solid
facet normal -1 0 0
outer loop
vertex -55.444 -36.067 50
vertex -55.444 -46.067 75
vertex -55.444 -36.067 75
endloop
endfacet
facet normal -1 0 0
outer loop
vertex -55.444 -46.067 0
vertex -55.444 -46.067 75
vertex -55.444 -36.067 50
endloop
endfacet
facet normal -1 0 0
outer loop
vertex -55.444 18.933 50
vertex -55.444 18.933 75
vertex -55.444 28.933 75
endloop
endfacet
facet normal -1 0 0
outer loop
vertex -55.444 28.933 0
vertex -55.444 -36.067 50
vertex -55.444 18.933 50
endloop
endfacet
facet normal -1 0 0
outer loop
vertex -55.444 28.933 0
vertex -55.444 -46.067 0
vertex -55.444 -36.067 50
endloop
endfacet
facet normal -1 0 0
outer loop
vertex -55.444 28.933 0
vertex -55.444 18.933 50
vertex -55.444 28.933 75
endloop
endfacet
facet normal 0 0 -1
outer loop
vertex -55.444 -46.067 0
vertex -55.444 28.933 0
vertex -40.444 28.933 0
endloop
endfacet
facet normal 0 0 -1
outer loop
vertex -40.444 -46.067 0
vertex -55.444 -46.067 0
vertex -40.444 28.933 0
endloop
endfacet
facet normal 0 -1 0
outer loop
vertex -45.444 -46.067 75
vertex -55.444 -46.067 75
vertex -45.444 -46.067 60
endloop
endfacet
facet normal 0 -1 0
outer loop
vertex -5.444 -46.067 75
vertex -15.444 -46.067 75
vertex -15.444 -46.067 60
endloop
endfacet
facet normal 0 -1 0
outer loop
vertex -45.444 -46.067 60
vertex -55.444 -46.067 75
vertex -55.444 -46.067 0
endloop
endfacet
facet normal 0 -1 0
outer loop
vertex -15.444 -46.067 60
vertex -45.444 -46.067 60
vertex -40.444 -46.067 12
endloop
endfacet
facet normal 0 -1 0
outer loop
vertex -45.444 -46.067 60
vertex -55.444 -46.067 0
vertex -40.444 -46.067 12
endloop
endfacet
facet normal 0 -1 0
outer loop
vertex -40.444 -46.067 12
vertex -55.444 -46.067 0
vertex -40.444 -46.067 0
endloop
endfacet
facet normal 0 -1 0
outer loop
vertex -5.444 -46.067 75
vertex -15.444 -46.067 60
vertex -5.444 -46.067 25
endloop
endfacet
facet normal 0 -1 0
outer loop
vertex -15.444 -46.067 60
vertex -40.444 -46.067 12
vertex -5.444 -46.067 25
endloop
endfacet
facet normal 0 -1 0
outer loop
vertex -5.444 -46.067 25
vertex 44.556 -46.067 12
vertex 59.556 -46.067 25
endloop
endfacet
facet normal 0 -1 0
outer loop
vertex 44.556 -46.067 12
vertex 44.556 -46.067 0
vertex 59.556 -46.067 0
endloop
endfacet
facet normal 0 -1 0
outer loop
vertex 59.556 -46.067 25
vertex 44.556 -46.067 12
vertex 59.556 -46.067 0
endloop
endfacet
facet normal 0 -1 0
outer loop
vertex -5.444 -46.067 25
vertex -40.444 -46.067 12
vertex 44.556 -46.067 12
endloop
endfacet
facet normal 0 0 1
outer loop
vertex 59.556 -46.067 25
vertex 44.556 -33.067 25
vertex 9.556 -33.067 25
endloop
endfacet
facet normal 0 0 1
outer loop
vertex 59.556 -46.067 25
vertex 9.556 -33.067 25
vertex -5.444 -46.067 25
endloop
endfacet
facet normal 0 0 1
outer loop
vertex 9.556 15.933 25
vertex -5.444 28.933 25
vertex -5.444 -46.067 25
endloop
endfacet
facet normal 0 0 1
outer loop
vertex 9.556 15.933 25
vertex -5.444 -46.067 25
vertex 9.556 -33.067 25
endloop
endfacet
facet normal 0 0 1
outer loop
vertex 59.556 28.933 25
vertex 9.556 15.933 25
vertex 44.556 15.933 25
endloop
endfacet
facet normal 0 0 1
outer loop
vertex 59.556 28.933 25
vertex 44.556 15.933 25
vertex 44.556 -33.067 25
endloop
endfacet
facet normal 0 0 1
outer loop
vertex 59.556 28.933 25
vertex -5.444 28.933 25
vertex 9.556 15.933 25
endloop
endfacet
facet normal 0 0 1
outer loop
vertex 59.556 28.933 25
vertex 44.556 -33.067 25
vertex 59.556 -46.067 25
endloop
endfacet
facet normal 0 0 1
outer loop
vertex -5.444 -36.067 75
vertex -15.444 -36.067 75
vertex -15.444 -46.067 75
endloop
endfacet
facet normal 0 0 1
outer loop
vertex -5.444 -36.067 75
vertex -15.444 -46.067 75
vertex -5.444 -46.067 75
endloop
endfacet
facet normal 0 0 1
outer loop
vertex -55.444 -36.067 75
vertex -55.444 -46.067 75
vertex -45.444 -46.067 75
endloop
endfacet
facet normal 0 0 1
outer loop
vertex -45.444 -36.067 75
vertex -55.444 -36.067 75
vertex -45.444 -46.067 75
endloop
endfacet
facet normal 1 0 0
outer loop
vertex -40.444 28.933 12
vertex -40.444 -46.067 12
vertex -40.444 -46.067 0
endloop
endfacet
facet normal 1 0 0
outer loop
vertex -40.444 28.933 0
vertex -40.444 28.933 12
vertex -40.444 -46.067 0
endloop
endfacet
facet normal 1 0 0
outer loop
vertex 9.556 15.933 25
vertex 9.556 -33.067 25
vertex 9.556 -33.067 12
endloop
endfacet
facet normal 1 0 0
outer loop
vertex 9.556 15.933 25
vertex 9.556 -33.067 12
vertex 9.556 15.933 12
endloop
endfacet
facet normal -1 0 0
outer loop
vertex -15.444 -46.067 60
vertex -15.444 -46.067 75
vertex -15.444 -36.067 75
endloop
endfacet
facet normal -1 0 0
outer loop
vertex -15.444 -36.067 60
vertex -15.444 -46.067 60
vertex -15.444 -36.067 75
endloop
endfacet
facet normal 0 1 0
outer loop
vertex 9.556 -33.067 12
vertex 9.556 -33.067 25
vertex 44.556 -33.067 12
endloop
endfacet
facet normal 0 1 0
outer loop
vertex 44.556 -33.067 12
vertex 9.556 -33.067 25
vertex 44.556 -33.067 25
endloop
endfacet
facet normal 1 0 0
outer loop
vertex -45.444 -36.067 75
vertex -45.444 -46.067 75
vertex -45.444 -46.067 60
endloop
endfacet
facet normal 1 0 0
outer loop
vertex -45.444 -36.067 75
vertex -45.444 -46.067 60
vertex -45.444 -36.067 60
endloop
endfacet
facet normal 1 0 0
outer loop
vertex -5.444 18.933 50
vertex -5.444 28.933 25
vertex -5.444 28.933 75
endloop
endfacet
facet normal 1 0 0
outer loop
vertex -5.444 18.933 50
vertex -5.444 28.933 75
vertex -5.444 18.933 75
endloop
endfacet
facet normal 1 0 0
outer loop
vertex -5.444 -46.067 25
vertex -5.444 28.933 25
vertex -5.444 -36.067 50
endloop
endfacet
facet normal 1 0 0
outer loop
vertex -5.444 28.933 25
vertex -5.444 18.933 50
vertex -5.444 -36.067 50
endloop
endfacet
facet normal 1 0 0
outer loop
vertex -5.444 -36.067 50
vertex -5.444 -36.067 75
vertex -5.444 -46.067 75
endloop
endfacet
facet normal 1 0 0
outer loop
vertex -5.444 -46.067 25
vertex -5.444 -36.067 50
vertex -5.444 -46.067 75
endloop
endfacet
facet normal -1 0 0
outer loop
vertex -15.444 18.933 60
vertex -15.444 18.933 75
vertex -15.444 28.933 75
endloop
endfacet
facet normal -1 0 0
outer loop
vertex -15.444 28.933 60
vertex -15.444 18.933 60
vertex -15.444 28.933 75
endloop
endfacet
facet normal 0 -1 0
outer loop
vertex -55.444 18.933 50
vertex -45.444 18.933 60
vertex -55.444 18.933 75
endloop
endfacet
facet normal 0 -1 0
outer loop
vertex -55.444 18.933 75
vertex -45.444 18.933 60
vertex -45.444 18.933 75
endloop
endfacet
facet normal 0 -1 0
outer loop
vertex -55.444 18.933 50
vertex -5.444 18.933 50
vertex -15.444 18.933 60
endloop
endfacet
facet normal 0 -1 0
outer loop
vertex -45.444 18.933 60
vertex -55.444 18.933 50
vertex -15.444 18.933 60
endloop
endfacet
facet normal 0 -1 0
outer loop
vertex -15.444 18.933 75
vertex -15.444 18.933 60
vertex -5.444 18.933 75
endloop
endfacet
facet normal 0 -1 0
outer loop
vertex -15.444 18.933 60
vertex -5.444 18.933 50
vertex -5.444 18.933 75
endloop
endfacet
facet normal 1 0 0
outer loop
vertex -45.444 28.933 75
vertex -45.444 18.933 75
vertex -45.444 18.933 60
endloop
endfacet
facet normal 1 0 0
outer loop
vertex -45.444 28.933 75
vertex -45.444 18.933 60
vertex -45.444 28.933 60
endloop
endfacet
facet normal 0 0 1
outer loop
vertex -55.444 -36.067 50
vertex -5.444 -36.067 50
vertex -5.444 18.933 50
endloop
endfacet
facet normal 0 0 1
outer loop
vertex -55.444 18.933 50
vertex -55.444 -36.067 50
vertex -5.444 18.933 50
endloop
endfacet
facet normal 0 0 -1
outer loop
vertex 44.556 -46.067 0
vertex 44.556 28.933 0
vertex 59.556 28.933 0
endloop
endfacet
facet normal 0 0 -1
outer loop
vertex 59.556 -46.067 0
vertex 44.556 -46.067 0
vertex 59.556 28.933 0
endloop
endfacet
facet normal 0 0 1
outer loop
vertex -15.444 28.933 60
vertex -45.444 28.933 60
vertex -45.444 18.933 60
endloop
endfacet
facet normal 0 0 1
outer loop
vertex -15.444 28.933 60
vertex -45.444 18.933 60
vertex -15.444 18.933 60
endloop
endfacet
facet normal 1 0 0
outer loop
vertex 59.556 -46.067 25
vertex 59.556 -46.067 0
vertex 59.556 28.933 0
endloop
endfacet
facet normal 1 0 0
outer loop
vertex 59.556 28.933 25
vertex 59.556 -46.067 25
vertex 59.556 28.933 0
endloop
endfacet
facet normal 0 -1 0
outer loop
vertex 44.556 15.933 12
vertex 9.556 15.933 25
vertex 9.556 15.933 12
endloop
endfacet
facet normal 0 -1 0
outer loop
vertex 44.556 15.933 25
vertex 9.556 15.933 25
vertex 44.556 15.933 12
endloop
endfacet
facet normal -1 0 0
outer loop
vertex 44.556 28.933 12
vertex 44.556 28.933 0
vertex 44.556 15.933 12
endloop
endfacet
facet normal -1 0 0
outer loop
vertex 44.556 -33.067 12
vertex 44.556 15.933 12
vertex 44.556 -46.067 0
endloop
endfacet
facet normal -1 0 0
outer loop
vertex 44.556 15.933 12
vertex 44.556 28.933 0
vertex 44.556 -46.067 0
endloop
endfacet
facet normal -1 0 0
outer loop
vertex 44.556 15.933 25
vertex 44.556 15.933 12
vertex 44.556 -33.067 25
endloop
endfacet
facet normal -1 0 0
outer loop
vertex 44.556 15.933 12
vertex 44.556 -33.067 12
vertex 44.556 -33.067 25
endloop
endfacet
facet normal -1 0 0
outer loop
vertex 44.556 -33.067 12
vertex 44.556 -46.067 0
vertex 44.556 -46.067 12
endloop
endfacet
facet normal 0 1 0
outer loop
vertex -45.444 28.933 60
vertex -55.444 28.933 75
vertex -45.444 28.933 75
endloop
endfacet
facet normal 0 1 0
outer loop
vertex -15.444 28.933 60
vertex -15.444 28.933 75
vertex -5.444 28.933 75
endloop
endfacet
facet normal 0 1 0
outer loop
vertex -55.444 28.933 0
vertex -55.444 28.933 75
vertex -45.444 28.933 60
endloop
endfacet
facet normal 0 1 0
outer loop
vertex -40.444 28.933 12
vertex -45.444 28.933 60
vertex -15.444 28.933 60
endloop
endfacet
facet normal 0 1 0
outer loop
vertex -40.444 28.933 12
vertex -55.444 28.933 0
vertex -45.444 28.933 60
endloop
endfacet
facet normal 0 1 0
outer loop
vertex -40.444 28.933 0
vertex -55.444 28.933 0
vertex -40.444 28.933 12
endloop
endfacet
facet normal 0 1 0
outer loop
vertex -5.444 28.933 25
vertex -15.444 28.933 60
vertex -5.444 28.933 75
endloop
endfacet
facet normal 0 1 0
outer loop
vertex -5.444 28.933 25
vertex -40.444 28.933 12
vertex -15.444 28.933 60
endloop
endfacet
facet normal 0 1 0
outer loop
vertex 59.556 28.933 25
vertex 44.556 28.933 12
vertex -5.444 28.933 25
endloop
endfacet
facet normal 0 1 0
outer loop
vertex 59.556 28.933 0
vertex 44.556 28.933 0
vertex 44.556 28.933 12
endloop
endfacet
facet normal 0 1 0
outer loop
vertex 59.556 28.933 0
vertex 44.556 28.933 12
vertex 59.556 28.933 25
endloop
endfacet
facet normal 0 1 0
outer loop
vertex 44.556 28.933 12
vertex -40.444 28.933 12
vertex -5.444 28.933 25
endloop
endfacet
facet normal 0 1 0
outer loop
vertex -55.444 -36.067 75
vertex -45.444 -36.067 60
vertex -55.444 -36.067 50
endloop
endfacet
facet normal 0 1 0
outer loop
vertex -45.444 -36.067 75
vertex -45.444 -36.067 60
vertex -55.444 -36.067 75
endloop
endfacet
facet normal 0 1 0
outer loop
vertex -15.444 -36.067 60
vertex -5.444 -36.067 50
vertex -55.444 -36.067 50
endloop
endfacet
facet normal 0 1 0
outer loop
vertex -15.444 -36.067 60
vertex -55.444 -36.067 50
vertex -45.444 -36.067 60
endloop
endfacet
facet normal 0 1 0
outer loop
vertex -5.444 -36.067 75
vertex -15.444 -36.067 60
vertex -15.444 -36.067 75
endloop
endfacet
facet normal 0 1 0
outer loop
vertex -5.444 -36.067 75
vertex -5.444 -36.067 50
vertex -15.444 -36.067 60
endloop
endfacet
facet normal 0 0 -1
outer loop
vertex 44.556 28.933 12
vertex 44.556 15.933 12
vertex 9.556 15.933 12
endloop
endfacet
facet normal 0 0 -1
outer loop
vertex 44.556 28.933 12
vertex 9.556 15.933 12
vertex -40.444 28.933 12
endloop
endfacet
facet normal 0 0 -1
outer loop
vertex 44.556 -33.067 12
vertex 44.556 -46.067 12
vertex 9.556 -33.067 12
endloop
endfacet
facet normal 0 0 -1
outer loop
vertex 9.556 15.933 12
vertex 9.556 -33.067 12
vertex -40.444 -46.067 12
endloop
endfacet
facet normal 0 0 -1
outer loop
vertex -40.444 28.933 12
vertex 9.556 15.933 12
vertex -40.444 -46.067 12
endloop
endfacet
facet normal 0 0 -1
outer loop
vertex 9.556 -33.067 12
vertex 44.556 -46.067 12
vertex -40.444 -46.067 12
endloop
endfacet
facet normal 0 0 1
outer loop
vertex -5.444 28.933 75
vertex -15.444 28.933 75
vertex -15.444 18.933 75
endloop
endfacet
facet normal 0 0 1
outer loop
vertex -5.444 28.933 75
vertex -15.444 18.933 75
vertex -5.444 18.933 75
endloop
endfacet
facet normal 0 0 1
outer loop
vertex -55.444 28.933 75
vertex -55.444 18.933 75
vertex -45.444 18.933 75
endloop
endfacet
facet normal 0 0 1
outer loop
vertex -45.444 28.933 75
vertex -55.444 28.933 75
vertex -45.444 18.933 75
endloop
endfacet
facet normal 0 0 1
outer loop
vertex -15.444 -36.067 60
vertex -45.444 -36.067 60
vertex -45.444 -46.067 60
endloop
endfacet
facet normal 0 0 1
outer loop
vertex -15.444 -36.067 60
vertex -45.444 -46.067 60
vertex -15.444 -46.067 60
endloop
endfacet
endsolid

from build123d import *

# Parameters (mm, degrees)
F0_W      = 115
F0_H      = 75
F1_DEPTH  = 25
F2_DEPTH  = 75
F4_DEPTH  = 75.001
F6_DEPTH  = 50
F7_W      = 55
F7_H      = 25
F8_DEPTH  = 50.001
F9_W      = 35
F9_H      = 49
F10_DEPTH = 25.001
F11_W     = 30
F11_H     = 10
F12_DEPTH = 15
F13_W     = 30
F13_H     = 10
F14_DEPTH = 15


with BuildPart() as f1:
    # F0 (on Top) → F1 (new body)
    with BuildSketch(Plane.XY):
        with Locations((2.0555268228, -8.5665475577)):
            Rectangle(F0_W, F0_H)
    extrude(amount=F1_DEPTH)

    # F0 (on Top) → F2 (join)
    with BuildSketch(Plane.XY):
        with Locations((2.0555268228, -8.5665475577)):
            Rectangle(F0_W, F0_H)
    extrude(amount=F2_DEPTH)

    # F3 (on face) → F4 (cut, through all)
    with BuildSketch(Plane.XZ.offset(46.0665475577)):
        Polygon((-40.4444731772, 12), (-40.4444731772, 0), (-1.3980267197, 0), (44.5555268228, 0), (44.5555268228, 12), align=None)
    extrude(amount=-F4_DEPTH, mode=Mode.SUBTRACT)

    # F5 (on face) → F6 (cut)
    with BuildSketch(Plane.XY.offset(75)):
        Polygon((59.5555268228, 28.9334524423), (-5.4444731772, 28.9334524423), (-5.4444731772, 18.9334524423), (-5.4444731772, -36.0665475577), (-5.4444731772, -46.0665475577), (59.5555268228, -46.0665475577), align=None)
    extrude(amount=-F6_DEPTH, mode=Mode.SUBTRACT)

    # F7 (on face) → F8 (cut, through all)
    with BuildSketch(Plane.YZ.offset(-5.4444731772)):
        with Locations((-8.5665475577, 62.5)):
            Rectangle(F7_W, F7_H)
    extrude(amount=-F8_DEPTH, mode=Mode.SUBTRACT)

    # F9 (on face) → F10 (cut, through all)
    with BuildSketch(Plane.XY.offset(25)):
        with Locations((27.0555268228, -8.5665475577)):
            Rectangle(F9_W, F9_H)
    extrude(amount=-F10_DEPTH, mode=Mode.SUBTRACT)

    # F11 (on face) → F12 (cut)
    with BuildSketch(Plane.XY.offset(75)):
        with Locations((-30.4444731772, 23.9334524423)):
            Rectangle(F11_W, F11_H)
    extrude(amount=-F12_DEPTH, mode=Mode.SUBTRACT)

    # F13 (on face) → F14 (cut)
    with BuildSketch(Plane.XY.offset(75)):
        with Locations((-30.4444731772, -41.0665475577)):
            Rectangle(F13_W, F13_H)
    extrude(amount=-F14_DEPTH, mode=Mode.SUBTRACT)


solid = f1.part
